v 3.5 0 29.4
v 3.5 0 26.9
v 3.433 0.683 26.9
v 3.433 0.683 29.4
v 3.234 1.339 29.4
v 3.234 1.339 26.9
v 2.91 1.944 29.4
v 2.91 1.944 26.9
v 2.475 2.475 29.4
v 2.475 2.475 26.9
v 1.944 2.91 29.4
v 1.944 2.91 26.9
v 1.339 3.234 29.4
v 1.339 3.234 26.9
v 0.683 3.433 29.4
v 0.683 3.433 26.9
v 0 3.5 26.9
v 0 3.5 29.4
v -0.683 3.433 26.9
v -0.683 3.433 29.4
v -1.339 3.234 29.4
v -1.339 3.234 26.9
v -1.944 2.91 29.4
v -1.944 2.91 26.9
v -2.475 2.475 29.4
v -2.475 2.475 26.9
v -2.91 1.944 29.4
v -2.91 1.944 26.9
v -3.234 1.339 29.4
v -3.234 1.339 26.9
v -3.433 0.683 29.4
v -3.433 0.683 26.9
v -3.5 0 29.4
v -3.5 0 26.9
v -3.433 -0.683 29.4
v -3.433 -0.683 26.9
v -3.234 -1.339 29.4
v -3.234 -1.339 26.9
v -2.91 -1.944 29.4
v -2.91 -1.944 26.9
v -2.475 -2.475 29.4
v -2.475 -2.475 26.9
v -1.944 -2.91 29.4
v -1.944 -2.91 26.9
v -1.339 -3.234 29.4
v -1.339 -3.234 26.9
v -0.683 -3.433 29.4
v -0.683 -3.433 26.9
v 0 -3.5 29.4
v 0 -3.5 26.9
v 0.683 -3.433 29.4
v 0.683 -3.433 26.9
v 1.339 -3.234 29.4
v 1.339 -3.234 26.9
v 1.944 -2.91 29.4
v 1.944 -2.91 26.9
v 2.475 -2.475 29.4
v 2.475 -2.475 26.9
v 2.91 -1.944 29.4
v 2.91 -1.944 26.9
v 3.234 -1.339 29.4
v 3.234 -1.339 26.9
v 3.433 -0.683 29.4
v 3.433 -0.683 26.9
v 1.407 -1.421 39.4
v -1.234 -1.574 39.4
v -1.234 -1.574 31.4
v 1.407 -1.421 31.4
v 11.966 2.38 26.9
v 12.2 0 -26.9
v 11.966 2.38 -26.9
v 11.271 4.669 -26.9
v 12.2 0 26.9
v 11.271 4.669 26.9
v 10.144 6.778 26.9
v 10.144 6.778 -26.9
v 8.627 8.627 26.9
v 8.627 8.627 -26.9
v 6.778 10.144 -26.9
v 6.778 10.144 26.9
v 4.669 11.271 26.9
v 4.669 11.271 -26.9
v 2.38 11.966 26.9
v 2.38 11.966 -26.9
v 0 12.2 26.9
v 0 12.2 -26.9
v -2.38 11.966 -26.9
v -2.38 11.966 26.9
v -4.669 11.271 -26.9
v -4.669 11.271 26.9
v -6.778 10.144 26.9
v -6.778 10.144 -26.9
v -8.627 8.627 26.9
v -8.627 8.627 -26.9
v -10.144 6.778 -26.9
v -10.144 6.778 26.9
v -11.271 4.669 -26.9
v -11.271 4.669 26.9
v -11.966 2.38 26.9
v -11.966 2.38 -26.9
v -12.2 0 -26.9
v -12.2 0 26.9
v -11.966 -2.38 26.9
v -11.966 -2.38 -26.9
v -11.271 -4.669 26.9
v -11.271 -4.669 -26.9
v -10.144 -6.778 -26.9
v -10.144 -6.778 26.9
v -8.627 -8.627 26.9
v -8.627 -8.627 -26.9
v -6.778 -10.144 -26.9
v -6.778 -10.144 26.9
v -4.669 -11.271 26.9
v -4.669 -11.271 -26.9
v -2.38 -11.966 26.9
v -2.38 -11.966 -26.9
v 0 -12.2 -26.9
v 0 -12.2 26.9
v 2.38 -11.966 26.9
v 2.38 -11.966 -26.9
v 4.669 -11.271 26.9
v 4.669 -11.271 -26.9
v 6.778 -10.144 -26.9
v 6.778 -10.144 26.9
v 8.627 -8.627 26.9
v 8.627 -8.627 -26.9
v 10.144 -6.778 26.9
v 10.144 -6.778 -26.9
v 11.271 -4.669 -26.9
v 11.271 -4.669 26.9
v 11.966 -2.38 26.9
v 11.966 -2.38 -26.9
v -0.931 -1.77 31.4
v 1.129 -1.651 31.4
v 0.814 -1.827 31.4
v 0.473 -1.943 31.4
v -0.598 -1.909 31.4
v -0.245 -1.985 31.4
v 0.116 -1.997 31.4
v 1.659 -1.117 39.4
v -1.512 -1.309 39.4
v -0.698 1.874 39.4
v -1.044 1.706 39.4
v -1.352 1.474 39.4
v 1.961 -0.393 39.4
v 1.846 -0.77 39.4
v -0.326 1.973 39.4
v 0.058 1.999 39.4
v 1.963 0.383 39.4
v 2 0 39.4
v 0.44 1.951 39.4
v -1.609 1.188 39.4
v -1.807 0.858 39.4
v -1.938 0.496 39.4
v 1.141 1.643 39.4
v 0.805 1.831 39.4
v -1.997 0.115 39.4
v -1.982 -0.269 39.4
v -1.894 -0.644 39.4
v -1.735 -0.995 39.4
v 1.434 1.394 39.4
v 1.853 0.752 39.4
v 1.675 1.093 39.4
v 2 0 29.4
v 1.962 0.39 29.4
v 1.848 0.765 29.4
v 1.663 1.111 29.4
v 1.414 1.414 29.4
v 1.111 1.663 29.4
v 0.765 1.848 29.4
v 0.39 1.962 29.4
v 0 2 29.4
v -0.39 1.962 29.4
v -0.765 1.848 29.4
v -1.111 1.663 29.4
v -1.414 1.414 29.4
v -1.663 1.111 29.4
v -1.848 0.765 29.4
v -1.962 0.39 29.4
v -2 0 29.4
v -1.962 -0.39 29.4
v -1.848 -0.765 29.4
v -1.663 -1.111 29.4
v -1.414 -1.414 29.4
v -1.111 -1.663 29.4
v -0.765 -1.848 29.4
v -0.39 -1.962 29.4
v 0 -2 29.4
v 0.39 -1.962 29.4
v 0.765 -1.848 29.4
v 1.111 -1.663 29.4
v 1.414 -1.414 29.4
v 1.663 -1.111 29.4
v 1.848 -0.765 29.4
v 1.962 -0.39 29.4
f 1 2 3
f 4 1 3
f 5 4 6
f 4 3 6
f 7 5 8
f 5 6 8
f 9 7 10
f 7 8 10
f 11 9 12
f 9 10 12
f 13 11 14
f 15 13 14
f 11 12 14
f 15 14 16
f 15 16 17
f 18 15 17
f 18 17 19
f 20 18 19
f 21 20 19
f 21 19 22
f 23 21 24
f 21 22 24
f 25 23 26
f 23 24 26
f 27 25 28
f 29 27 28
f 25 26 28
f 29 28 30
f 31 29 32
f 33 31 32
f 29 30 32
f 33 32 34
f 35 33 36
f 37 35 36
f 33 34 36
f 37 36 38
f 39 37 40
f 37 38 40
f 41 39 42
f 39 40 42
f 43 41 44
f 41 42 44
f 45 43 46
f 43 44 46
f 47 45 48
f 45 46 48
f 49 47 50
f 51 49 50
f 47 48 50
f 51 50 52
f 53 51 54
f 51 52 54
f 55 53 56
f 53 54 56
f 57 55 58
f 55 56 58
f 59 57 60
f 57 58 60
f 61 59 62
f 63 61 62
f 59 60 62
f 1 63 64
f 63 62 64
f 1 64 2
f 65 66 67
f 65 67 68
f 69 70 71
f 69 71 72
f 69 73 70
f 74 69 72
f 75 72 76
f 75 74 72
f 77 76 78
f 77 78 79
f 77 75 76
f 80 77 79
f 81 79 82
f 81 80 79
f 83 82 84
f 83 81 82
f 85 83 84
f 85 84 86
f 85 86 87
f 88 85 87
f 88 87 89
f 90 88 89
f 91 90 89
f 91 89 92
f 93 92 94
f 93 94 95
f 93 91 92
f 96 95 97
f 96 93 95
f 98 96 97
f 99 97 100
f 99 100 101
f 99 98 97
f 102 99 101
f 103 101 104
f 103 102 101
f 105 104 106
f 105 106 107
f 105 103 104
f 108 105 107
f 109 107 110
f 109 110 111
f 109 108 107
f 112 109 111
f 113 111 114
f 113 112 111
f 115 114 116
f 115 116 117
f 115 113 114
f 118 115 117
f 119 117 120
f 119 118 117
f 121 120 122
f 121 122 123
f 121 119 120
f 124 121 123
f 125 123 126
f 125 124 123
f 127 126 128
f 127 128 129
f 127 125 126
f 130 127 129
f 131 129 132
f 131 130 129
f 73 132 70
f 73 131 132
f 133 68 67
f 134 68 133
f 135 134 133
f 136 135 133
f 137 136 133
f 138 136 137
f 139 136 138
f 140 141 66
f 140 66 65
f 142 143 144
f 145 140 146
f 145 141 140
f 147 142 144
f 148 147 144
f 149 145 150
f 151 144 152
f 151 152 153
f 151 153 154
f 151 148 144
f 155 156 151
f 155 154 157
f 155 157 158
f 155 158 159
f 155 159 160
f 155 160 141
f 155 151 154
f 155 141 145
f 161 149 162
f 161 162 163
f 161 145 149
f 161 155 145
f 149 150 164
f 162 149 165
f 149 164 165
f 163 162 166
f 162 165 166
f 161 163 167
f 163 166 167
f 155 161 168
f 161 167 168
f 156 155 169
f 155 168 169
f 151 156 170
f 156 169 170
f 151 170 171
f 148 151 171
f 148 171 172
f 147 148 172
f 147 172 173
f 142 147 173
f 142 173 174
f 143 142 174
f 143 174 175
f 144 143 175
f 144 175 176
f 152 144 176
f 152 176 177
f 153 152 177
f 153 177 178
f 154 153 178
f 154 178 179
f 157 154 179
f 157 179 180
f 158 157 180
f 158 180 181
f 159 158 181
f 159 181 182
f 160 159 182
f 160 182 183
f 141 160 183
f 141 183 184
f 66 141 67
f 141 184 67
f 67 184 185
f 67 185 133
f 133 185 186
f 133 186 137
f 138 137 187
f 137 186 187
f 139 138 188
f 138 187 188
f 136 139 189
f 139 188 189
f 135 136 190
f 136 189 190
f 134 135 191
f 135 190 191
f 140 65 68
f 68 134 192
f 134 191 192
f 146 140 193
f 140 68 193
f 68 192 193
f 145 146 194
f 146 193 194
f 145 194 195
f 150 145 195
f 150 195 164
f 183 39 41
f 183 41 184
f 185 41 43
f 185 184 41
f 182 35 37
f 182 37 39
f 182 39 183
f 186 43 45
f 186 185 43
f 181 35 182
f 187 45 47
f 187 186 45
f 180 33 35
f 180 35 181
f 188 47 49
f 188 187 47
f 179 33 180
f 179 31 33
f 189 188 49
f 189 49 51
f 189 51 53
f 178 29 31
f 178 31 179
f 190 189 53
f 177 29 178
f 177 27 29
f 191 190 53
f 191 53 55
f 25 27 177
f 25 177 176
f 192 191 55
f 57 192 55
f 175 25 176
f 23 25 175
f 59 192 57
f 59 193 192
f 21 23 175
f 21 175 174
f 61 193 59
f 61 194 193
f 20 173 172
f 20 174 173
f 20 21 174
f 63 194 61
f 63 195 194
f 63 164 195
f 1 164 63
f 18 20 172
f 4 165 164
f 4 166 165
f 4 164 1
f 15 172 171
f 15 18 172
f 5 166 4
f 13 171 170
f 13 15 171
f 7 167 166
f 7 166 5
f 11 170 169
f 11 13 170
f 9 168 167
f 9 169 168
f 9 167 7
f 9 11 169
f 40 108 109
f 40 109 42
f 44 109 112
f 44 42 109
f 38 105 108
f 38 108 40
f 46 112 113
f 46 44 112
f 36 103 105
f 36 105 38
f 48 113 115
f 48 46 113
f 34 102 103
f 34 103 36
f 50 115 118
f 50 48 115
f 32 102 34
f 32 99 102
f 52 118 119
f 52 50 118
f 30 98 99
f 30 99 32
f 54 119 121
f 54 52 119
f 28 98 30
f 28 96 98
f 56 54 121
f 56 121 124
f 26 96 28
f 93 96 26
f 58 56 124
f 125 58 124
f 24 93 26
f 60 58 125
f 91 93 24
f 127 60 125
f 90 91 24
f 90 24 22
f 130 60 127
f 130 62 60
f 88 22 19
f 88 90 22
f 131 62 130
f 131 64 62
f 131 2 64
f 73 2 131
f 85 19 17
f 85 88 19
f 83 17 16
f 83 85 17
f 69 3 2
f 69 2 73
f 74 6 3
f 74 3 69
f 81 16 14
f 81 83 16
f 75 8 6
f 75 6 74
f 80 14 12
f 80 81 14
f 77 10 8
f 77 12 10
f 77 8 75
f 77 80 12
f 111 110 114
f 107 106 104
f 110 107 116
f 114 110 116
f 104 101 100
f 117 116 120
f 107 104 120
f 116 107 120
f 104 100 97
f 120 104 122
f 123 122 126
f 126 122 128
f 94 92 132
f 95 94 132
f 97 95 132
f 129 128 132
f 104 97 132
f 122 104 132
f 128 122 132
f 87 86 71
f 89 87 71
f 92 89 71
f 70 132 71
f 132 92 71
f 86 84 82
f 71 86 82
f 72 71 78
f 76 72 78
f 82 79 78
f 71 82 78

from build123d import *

# Parameters (mm, degrees)
ESQUISSE1_R             = 12.2
BOSS_EXTRU_1_DEPTH      = 26.9
ESQUISSE2_R             = 3.5
BOSS_EXTRU_2_DEPTH      = 2.5
ESQUISSE3_R             = 2
BOSS_EXTRU_3_DEPTH      = 10
ENL_V_MAT_EXTRU_1_DEPTH = 8


with BuildPart() as part:
    # Esquisse1 → Boss.-Extru.1 (new body, symmetric)
    with BuildSketch(Plane.XY):
        Circle(ESQUISSE1_R)
    extrude(amount=BOSS_EXTRU_1_DEPTH, both=True)

    # Esquisse2 → Boss.-Extru.2 (add)
    with BuildSketch(Plane.XY.offset(26.9)):
        Circle(ESQUISSE2_R)
    extrude(amount=BOSS_EXTRU_2_DEPTH)

    # Esquisse3 → Boss.-Extru.3 (add)
    with BuildSketch(Plane.XY.offset(29.4)):
        Circle(ESQUISSE3_R)
    extrude(amount=BOSS_EXTRU_3_DEPTH)

    # Esquisse4 → Enlèv. mat.-Extru.1 (cut)
    with BuildSketch(Plane.XY.offset(39.4)):
        with BuildLine():
            Line((-1.233818862, -1.574068301), (1.407495119, -1.42090024))
            ThreePointArc((1.407495119, -1.42090024), (0.115784171, -1.996645694), (-1.233818862, -1.574068301))
        make_face()
    extrude(amount=-ENL_V_MAT_EXTRU_1_DEPTH, mode=Mode.SUBTRACT)


solid = part.part
